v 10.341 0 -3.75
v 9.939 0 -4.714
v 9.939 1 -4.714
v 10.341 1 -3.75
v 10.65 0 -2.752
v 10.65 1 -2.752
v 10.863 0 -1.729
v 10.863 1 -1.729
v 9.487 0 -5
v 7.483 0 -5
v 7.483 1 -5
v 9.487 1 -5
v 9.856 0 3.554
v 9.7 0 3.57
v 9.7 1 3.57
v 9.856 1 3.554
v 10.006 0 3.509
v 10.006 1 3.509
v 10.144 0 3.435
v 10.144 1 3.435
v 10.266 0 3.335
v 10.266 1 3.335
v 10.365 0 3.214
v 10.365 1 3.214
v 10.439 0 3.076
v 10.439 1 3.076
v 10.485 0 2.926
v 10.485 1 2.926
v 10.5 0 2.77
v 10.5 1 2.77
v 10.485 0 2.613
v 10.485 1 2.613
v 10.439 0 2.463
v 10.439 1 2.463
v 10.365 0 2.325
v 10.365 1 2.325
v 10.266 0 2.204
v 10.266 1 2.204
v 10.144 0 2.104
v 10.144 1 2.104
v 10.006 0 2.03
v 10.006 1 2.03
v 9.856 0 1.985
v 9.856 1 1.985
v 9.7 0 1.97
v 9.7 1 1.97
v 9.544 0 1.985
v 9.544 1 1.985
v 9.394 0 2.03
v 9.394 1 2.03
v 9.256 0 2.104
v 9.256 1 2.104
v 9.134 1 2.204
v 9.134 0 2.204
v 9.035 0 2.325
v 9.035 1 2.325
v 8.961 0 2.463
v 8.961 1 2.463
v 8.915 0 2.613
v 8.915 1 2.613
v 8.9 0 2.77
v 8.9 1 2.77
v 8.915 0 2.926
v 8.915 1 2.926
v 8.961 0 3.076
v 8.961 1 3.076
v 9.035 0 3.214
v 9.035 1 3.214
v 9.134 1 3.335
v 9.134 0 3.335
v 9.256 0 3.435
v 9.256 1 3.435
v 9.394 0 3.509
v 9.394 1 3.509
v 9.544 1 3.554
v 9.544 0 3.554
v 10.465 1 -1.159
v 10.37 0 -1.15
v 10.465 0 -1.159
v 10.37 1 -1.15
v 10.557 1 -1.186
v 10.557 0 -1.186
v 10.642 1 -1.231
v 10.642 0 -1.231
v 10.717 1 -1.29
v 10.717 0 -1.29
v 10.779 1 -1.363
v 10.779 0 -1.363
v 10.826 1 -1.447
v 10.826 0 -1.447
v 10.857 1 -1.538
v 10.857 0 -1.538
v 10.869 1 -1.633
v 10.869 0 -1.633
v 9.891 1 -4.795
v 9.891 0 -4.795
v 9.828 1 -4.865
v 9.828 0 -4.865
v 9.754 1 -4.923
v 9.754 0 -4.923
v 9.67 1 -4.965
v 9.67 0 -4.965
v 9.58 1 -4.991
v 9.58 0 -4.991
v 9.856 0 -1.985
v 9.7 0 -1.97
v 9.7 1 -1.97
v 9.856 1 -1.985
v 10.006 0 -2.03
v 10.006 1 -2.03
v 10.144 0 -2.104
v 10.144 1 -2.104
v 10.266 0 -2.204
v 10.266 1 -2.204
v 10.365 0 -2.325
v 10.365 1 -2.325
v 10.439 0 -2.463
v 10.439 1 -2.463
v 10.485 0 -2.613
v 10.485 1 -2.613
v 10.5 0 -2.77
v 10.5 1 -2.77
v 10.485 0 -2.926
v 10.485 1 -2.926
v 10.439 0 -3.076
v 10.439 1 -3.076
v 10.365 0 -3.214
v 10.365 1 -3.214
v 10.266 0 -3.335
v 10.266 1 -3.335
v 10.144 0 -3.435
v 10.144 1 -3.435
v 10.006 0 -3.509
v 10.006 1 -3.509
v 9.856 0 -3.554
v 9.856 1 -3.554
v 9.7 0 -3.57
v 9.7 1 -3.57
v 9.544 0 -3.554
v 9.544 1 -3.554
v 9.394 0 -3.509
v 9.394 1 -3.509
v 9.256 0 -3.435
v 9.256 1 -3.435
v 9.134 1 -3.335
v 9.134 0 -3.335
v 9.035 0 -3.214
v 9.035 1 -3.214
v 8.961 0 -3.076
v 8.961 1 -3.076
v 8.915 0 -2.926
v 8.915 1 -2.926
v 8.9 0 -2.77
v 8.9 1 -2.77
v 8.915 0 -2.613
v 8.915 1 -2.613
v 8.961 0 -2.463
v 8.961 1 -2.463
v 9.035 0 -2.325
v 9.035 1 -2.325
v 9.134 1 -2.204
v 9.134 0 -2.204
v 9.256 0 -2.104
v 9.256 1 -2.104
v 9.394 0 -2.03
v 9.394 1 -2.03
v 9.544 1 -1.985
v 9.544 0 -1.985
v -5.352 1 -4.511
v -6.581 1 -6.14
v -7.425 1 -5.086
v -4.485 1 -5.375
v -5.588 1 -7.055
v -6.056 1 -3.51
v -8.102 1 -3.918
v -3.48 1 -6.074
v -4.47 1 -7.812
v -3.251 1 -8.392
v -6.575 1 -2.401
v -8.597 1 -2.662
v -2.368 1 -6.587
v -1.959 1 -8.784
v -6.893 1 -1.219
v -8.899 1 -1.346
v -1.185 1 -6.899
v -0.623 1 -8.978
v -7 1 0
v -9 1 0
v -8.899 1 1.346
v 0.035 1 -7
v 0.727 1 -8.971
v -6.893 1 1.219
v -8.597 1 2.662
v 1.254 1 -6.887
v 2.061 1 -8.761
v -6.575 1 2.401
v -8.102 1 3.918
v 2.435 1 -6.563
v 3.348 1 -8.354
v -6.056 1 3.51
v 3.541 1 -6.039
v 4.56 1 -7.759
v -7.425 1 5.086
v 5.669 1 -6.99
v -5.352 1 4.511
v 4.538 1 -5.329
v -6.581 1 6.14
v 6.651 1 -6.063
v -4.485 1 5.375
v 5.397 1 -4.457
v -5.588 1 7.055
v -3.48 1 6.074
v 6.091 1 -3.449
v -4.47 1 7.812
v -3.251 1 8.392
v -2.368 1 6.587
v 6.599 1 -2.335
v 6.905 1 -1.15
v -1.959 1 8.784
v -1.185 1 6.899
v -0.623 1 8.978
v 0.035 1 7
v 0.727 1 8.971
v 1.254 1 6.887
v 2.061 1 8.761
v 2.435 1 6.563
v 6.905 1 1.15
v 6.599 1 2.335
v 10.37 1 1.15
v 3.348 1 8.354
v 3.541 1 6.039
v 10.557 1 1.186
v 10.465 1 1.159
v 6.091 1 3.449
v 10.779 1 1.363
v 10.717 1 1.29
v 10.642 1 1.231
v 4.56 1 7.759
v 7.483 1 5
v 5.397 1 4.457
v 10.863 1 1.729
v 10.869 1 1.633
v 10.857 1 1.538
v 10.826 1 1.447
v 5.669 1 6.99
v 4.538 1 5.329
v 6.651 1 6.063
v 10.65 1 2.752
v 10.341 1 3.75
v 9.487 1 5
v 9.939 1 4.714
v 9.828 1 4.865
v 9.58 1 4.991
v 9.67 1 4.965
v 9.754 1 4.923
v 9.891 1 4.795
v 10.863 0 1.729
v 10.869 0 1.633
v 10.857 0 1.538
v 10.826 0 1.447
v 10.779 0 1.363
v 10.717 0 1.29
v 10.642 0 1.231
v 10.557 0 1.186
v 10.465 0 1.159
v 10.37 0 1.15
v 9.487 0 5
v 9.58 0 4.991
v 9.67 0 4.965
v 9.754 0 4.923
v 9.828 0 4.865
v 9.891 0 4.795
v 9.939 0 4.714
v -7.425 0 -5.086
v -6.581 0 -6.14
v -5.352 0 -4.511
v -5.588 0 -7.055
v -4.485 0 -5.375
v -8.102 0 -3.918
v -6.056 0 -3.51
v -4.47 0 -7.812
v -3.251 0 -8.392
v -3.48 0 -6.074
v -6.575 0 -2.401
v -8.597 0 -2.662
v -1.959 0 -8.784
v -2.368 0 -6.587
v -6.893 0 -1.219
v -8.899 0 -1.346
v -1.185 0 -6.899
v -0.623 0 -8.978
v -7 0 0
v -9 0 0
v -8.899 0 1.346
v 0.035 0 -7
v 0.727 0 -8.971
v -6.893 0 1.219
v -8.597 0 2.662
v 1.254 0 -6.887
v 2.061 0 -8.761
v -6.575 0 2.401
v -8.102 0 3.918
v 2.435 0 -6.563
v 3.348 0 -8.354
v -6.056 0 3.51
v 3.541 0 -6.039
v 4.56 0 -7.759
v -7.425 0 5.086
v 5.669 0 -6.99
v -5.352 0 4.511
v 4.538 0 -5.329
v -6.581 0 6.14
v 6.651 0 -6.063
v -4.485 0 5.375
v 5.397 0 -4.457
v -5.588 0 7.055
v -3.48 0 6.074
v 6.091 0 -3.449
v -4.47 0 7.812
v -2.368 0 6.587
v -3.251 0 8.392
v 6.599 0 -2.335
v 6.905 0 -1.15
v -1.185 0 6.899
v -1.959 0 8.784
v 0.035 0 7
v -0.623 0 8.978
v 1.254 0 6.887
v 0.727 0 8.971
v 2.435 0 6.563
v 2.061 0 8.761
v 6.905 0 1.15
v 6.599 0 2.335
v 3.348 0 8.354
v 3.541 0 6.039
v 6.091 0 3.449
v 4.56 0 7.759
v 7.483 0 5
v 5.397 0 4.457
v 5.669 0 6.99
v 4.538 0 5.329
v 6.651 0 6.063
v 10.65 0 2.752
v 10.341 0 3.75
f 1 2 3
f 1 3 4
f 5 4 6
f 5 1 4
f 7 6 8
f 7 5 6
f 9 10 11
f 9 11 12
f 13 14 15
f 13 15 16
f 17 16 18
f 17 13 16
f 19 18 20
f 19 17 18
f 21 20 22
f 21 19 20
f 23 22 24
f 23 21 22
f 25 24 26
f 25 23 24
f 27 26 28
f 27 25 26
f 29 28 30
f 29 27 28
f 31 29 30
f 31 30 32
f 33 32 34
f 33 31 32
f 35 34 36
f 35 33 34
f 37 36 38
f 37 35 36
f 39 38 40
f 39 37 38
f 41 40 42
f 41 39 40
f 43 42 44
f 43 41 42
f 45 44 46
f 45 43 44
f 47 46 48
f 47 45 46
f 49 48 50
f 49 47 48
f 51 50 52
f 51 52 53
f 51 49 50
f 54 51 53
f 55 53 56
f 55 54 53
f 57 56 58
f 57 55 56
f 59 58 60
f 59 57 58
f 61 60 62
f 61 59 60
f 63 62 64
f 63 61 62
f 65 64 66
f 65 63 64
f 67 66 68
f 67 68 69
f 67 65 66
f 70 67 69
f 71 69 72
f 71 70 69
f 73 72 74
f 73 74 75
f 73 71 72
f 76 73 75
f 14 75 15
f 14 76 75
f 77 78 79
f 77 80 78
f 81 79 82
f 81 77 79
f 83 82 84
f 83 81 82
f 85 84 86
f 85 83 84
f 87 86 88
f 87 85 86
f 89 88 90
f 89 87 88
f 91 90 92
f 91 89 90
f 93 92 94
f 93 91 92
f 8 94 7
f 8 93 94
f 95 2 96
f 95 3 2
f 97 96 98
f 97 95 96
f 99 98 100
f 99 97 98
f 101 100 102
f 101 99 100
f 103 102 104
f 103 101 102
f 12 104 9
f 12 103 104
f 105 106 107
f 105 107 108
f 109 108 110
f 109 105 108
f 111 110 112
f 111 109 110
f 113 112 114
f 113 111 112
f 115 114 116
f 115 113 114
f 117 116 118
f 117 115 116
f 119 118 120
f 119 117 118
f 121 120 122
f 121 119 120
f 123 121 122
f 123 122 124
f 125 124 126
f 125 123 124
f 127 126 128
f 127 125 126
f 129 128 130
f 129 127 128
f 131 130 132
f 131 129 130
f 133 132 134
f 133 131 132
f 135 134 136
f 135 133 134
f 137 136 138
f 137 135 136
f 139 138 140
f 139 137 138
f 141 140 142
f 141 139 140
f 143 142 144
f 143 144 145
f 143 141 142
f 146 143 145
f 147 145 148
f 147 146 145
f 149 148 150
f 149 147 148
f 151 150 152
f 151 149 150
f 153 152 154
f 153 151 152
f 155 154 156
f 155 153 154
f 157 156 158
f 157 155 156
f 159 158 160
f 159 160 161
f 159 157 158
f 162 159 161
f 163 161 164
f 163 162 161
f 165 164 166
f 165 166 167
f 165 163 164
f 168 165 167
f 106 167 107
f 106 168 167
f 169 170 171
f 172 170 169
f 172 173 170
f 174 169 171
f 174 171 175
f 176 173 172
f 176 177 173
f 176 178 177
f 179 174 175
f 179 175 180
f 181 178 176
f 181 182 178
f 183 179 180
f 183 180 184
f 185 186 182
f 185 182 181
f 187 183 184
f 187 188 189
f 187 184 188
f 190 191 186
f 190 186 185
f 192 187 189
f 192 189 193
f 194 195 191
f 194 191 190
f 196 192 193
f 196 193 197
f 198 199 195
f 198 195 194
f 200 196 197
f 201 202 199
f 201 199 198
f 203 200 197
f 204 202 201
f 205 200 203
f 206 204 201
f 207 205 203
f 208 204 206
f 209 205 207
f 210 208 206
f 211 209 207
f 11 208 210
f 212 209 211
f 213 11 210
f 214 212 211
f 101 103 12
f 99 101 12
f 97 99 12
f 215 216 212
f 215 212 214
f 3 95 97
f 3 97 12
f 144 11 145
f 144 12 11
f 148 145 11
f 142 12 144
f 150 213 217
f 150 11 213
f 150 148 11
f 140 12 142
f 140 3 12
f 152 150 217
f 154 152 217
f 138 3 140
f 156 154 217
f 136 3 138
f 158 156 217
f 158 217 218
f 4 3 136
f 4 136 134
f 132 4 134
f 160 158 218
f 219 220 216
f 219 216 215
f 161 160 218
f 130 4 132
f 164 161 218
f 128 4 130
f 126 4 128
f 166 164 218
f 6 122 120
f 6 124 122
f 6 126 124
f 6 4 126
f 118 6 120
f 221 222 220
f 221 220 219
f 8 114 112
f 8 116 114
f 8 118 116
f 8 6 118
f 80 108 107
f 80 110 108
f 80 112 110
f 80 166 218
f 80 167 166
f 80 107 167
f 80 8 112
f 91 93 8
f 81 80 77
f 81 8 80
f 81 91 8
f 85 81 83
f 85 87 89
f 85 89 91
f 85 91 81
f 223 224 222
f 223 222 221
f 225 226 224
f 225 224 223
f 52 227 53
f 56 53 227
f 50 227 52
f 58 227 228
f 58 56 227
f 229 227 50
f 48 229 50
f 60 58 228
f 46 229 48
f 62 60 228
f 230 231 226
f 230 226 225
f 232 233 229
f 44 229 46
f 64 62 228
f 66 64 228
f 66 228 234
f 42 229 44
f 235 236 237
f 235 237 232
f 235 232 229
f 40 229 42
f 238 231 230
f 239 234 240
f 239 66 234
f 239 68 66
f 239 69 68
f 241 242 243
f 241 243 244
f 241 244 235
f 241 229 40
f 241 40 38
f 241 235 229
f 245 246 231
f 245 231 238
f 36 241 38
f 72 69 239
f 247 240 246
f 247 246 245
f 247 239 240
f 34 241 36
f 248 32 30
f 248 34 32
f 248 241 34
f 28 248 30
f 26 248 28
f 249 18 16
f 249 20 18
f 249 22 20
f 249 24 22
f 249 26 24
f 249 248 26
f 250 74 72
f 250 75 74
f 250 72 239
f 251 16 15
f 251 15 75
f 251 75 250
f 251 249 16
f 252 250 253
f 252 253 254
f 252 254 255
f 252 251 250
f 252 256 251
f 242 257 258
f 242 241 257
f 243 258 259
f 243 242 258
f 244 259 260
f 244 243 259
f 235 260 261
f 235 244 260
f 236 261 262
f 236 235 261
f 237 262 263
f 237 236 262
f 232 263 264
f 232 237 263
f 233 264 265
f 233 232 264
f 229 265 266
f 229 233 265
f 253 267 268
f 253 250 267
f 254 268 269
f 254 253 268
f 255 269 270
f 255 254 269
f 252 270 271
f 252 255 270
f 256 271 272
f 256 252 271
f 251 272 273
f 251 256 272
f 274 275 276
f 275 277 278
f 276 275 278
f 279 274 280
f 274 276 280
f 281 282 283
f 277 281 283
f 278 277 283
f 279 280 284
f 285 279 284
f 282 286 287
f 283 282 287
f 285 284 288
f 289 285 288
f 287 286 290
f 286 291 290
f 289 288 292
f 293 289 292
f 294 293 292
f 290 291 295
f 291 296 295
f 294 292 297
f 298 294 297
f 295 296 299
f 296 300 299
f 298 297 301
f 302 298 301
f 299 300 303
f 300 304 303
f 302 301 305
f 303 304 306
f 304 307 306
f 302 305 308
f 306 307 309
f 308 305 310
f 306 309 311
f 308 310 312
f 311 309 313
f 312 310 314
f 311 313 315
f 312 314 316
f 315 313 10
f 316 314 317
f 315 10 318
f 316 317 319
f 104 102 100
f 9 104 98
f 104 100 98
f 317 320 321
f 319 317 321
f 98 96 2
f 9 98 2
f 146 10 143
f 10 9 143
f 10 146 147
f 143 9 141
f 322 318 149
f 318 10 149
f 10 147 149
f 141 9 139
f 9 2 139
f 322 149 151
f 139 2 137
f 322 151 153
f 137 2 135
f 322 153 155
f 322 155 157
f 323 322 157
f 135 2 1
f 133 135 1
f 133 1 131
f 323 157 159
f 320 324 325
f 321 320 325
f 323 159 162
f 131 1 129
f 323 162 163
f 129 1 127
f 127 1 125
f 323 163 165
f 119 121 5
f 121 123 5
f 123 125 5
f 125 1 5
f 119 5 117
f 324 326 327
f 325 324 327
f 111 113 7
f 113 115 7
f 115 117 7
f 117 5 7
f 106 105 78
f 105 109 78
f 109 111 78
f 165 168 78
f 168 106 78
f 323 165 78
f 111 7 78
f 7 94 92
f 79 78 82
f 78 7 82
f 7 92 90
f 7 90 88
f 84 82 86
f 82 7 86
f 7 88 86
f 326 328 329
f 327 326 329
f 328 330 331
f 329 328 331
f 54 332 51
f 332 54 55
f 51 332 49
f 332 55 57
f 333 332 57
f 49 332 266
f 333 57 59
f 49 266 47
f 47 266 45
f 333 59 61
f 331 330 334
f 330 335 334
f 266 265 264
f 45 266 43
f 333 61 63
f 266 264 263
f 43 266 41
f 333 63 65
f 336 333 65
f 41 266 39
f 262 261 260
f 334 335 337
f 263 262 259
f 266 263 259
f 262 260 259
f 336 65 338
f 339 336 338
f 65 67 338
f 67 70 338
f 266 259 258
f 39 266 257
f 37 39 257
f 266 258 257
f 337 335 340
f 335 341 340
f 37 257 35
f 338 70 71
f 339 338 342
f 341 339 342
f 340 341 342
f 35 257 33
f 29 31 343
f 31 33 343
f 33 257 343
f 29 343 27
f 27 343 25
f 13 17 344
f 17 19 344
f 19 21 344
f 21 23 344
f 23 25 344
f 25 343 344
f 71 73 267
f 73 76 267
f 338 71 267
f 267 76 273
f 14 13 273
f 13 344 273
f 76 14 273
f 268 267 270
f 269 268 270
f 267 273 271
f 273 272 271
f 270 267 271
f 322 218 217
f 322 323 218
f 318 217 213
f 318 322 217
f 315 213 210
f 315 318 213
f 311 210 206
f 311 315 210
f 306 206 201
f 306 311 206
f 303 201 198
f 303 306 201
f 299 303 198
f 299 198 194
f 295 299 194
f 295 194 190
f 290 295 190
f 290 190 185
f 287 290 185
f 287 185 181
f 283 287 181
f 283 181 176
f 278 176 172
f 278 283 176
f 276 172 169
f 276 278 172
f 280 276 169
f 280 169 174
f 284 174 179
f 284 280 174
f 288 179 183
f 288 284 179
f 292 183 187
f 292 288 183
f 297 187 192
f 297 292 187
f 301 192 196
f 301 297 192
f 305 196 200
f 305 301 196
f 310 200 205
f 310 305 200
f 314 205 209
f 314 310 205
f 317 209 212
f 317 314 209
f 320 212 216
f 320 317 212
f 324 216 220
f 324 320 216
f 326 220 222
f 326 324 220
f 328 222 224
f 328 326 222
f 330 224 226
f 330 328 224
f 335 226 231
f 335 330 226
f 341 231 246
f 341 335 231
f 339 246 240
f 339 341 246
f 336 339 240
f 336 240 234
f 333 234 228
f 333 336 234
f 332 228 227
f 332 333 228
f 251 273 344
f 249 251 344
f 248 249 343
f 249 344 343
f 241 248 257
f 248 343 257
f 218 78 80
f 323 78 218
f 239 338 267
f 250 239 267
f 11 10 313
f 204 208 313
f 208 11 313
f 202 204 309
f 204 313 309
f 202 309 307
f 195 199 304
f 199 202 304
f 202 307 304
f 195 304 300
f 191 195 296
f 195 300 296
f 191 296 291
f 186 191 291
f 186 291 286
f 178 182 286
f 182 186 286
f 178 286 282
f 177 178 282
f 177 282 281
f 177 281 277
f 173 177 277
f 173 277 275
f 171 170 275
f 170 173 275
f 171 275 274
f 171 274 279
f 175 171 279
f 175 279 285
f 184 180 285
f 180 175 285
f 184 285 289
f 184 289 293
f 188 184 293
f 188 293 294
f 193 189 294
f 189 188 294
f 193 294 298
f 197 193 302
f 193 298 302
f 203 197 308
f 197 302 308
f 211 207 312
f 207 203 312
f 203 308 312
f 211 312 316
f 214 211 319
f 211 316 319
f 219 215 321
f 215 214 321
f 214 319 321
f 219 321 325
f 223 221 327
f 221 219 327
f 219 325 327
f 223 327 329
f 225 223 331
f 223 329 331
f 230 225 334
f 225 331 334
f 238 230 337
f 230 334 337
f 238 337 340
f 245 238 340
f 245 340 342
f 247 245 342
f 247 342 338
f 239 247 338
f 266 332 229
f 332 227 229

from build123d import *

# Parameters (mm, degrees)
SKETCH_1_R          = 9
SKETCH_1_R_2        = 7
EXTRUDE_1_DEPTH     = 1
EXTRUDE_START       = -1
SKETCH_2_R          = 0.8
EXTRUDE_2_DEPTH     = 1
SKETCH_3_W          = 6.510588585
SKETCH_3_H          = 2.3
CUT_EXTRUDE_1_DEPTH = 15.201320361
FILLET_1_R          = 0.5


with BuildPart() as part:
    # 草图1 → 凸台-拉伸1 (new body)
    with BuildSketch(Plane(origin=(0, 0, 0), x_dir=(1, 0, 0), z_dir=(0, 1, 0))):
        with Locations(Location((0, 0, 0), (0, 0, 270))):
            Circle(SKETCH_1_R)
        with Locations(Location((0, 0, 0), (0, 0, 270))):
            Circle(SKETCH_1_R_2, mode=Mode.SUBTRACT)
    extrude(amount=EXTRUDE_1_DEPTH)

    # 草图2 → 凸台-拉伸2 (add)
    # profile 1 of 2: a face of its own
    with BuildSketch(Plane(origin=(0, 1, 0), x_dir=(1, 0, 0), z_dir=(0, 1, 0)).offset(EXTRUDE_START)):
        with BuildLine():
            Line((10.939721203, 1.15), (8.926225406, 1.15))
            ThreePointArc((8.926225406, 1.15), (8.427566507, 3.158500083), (7.483314774, 5))
            Line((7.483314774, 5), (9.797958971, 5))
            ThreePointArc((9.797958971, 5), (10.546016772, 3.127543804), (10.939721203, 1.15))
        make_face()
        with Locations(Location((9.7, 2.769537095, 0), (0, 0, 270))):
            Circle(SKETCH_2_R, mode=Mode.SUBTRACT)
    # profile 2 of 2: a face of its own
    with BuildSketch(Plane(origin=(0, 1, 0), x_dir=(1, 0, 0), z_dir=(0, 1, 0)).offset(EXTRUDE_START)):
        with BuildLine():
            Line((10.939721203, -1.15), (8.926225406, -1.15))
            ThreePointArc((8.926225406, -1.15), (8.427566507, -3.158500083), (7.483314774, -5))
            Line((7.483314774, -5), (9.797958971, -5))
            ThreePointArc((9.797958971, -5), (10.546016772, -3.127543804), (10.939721203, -1.15))
        make_face()
        with Locations(Location((9.7, -2.769537095, 0), (0, 0, 270))):
            Circle(SKETCH_2_R, mode=Mode.SUBTRACT)
    extrude(amount=EXTRUDE_2_DEPTH)

    # 草图3 → 切除-拉伸1 (cut, through all)
    with BuildSketch(Plane(origin=(0, 1, 0), x_dir=(1, 0, 0), z_dir=(0, 1, 0))):
        with Locations((7.684426911, 0)):
            Rectangle(SKETCH_3_W, SKETCH_3_H)
    extrude(amount=-CUT_EXTRUDE_1_DEPTH, mode=Mode.SUBTRACT)

    # 圆角1
    fillet_1_edges = [part.edges().sort_by_distance(p)[0] for p in [
        (10.939721203, 0.5, -1.15),
        (9.797958971, 0.5, -5),
        (9.797958971, 0.5, 5),
        (10.939721203, 0.5, 1.15),
    ]]
    fillet(fillet_1_edges, radius=FILLET_1_R)


solid = part.part
